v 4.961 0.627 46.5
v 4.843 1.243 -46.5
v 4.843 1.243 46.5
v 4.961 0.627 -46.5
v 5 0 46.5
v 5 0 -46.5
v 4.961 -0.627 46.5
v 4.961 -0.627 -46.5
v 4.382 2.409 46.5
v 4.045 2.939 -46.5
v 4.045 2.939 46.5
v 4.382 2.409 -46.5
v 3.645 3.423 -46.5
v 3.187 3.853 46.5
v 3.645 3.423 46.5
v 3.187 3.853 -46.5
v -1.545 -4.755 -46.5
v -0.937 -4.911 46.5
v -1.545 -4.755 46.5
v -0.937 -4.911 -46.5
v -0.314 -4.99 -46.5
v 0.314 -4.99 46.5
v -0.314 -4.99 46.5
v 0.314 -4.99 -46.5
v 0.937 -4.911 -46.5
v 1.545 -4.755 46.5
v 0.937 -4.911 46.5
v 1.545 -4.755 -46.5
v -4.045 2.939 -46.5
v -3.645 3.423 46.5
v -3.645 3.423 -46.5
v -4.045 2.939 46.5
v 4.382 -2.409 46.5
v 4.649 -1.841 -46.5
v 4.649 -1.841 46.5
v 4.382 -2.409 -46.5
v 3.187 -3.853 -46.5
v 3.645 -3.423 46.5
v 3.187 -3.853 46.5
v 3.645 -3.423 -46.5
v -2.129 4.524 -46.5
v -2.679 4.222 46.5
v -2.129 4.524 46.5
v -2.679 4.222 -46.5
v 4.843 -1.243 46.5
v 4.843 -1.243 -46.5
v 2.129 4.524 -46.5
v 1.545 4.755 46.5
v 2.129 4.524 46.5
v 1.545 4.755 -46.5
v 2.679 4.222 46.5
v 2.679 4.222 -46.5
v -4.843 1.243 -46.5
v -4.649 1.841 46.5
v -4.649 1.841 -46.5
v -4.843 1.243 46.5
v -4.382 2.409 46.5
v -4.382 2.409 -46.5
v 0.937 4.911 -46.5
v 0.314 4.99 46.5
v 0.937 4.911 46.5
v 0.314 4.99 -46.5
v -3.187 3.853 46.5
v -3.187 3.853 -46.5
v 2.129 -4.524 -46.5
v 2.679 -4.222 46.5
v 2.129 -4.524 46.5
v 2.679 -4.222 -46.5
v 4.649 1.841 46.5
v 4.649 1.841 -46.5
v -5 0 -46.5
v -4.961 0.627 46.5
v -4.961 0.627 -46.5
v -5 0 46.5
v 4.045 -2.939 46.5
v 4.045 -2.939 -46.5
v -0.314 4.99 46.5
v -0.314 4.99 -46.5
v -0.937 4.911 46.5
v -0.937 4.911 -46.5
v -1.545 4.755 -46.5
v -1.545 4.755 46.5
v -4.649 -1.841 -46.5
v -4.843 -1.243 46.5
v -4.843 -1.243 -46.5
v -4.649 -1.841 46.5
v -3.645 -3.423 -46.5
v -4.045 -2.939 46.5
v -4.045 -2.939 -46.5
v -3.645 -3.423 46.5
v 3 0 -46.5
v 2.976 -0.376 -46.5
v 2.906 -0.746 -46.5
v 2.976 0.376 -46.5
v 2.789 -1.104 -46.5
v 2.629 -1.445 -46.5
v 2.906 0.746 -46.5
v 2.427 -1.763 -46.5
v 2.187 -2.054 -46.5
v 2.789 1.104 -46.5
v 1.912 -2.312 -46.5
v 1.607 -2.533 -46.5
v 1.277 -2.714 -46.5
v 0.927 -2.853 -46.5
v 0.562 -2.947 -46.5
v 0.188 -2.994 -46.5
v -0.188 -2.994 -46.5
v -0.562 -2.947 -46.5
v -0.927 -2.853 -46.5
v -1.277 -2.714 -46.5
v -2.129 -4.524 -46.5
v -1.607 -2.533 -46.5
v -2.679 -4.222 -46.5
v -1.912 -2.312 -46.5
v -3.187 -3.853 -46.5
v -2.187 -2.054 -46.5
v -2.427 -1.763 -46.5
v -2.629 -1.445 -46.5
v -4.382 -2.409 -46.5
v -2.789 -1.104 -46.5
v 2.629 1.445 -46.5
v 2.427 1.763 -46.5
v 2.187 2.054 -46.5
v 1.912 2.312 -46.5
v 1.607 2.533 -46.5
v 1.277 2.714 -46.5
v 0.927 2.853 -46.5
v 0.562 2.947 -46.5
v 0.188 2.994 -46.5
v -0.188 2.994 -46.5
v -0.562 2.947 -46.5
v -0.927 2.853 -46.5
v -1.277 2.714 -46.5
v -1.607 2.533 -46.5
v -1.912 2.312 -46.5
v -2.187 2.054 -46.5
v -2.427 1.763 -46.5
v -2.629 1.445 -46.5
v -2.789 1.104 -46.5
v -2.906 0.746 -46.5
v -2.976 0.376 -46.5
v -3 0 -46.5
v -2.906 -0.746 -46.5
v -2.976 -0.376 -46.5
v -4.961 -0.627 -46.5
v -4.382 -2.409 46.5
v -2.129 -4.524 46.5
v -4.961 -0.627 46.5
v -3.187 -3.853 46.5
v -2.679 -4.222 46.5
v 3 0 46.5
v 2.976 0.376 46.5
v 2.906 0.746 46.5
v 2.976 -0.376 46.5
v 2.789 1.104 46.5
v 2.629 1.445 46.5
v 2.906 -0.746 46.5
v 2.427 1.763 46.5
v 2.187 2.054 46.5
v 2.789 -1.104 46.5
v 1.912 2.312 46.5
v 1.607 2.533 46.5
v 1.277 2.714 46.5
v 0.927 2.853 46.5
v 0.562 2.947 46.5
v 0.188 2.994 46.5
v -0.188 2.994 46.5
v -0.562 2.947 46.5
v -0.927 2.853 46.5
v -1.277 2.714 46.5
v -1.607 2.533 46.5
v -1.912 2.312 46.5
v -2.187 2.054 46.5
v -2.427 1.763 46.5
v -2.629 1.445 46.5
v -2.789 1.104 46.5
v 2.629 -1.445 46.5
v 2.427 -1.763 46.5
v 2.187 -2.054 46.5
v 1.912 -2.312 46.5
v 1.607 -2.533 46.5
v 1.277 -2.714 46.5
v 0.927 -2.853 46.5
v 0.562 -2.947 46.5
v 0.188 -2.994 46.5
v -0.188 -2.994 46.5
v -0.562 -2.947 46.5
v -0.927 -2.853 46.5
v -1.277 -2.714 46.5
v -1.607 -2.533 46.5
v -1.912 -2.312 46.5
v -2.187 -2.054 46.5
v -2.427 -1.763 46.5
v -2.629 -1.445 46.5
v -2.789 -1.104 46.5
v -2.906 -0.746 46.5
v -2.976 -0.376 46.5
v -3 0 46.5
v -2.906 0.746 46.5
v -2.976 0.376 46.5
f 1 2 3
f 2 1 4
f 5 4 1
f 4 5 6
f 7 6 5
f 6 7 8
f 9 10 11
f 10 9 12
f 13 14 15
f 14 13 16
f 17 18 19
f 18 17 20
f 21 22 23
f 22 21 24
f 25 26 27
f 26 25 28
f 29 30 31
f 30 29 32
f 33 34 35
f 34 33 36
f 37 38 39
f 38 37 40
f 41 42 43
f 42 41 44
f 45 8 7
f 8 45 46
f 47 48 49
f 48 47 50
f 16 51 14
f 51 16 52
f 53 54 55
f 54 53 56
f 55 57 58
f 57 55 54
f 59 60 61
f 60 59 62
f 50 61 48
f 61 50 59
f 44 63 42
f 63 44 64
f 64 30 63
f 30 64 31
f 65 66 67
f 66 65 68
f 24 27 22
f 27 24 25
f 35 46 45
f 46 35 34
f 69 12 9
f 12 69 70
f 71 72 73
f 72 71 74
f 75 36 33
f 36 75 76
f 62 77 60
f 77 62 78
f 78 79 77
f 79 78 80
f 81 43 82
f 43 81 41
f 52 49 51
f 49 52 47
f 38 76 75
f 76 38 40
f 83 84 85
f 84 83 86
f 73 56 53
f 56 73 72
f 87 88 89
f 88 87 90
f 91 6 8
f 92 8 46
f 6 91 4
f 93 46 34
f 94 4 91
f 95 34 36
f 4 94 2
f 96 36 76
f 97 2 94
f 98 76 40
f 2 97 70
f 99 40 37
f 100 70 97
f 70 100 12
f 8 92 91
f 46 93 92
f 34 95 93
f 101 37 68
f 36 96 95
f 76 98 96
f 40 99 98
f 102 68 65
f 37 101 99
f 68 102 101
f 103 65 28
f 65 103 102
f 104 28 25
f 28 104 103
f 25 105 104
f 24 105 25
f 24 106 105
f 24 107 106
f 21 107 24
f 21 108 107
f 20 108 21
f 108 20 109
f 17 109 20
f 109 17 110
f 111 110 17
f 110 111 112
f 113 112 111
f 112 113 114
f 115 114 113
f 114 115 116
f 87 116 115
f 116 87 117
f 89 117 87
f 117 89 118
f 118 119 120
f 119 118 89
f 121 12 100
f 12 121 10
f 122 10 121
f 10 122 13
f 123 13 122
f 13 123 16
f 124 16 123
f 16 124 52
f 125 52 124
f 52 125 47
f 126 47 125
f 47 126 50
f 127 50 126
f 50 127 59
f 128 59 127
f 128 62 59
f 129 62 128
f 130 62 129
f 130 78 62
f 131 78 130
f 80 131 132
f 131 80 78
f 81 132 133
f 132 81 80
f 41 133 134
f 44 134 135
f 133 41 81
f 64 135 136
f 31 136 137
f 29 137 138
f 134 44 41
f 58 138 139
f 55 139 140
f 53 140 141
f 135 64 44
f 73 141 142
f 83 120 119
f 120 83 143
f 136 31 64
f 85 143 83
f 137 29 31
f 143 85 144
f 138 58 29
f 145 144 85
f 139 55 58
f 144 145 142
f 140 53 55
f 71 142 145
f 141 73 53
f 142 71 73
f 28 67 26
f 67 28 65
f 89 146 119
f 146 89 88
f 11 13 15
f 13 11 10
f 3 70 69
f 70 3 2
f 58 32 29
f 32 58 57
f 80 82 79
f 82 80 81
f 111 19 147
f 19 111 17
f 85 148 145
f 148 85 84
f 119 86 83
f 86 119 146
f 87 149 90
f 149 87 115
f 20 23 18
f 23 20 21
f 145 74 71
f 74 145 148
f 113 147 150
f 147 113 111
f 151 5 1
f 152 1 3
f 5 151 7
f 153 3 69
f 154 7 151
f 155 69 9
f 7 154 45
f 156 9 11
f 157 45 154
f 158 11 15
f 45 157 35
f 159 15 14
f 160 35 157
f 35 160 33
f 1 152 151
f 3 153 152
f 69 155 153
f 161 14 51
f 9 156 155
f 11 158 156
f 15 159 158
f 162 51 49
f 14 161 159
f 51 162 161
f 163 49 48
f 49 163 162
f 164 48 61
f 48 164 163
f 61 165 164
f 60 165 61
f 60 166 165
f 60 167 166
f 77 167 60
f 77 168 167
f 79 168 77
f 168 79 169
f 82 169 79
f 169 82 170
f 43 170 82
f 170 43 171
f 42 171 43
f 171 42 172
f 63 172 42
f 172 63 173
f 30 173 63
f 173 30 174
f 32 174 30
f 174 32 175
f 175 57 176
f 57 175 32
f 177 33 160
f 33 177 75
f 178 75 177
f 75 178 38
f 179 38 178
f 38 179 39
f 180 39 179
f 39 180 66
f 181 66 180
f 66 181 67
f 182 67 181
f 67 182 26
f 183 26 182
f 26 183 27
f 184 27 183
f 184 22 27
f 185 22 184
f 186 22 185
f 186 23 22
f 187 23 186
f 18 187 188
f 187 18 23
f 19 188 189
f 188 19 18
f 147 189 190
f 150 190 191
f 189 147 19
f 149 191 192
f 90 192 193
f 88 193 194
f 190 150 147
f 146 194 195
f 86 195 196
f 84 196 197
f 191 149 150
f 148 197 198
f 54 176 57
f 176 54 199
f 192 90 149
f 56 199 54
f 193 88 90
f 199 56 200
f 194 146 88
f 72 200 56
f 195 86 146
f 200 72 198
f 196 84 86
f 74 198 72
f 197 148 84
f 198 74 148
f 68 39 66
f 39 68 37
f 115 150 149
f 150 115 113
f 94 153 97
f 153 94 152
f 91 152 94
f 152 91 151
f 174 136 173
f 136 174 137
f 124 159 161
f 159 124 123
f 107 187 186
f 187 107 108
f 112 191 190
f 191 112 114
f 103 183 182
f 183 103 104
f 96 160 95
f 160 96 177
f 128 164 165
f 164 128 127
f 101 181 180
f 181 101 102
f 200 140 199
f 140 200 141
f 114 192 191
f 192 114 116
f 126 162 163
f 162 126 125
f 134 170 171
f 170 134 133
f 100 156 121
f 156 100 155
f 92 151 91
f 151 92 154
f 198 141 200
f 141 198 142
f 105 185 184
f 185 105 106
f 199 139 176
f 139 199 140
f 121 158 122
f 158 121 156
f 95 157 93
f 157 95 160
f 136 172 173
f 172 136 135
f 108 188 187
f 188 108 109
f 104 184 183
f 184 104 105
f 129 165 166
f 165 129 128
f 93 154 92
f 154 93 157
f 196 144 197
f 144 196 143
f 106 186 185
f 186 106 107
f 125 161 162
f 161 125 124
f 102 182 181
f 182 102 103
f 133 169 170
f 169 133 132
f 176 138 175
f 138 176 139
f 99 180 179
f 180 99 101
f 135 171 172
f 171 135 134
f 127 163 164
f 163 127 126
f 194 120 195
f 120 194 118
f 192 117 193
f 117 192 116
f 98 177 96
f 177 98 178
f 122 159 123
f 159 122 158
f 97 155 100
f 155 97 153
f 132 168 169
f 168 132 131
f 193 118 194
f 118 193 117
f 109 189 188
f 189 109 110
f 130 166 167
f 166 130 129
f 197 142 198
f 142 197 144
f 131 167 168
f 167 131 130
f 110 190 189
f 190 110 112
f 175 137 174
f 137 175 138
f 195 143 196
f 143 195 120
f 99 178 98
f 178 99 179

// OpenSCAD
$fn = 50;


difference() {
	union() {
		translate(v = [0, 0, -46.5000000000]) {
			cylinder(h = 93, r = 5.0000000000);
		}
	}
	union() {
		translate(v = [0, 0, -100.0000000000]) {
			cylinder(h = 200, r = 3.0000000000);
		}
	}
}
